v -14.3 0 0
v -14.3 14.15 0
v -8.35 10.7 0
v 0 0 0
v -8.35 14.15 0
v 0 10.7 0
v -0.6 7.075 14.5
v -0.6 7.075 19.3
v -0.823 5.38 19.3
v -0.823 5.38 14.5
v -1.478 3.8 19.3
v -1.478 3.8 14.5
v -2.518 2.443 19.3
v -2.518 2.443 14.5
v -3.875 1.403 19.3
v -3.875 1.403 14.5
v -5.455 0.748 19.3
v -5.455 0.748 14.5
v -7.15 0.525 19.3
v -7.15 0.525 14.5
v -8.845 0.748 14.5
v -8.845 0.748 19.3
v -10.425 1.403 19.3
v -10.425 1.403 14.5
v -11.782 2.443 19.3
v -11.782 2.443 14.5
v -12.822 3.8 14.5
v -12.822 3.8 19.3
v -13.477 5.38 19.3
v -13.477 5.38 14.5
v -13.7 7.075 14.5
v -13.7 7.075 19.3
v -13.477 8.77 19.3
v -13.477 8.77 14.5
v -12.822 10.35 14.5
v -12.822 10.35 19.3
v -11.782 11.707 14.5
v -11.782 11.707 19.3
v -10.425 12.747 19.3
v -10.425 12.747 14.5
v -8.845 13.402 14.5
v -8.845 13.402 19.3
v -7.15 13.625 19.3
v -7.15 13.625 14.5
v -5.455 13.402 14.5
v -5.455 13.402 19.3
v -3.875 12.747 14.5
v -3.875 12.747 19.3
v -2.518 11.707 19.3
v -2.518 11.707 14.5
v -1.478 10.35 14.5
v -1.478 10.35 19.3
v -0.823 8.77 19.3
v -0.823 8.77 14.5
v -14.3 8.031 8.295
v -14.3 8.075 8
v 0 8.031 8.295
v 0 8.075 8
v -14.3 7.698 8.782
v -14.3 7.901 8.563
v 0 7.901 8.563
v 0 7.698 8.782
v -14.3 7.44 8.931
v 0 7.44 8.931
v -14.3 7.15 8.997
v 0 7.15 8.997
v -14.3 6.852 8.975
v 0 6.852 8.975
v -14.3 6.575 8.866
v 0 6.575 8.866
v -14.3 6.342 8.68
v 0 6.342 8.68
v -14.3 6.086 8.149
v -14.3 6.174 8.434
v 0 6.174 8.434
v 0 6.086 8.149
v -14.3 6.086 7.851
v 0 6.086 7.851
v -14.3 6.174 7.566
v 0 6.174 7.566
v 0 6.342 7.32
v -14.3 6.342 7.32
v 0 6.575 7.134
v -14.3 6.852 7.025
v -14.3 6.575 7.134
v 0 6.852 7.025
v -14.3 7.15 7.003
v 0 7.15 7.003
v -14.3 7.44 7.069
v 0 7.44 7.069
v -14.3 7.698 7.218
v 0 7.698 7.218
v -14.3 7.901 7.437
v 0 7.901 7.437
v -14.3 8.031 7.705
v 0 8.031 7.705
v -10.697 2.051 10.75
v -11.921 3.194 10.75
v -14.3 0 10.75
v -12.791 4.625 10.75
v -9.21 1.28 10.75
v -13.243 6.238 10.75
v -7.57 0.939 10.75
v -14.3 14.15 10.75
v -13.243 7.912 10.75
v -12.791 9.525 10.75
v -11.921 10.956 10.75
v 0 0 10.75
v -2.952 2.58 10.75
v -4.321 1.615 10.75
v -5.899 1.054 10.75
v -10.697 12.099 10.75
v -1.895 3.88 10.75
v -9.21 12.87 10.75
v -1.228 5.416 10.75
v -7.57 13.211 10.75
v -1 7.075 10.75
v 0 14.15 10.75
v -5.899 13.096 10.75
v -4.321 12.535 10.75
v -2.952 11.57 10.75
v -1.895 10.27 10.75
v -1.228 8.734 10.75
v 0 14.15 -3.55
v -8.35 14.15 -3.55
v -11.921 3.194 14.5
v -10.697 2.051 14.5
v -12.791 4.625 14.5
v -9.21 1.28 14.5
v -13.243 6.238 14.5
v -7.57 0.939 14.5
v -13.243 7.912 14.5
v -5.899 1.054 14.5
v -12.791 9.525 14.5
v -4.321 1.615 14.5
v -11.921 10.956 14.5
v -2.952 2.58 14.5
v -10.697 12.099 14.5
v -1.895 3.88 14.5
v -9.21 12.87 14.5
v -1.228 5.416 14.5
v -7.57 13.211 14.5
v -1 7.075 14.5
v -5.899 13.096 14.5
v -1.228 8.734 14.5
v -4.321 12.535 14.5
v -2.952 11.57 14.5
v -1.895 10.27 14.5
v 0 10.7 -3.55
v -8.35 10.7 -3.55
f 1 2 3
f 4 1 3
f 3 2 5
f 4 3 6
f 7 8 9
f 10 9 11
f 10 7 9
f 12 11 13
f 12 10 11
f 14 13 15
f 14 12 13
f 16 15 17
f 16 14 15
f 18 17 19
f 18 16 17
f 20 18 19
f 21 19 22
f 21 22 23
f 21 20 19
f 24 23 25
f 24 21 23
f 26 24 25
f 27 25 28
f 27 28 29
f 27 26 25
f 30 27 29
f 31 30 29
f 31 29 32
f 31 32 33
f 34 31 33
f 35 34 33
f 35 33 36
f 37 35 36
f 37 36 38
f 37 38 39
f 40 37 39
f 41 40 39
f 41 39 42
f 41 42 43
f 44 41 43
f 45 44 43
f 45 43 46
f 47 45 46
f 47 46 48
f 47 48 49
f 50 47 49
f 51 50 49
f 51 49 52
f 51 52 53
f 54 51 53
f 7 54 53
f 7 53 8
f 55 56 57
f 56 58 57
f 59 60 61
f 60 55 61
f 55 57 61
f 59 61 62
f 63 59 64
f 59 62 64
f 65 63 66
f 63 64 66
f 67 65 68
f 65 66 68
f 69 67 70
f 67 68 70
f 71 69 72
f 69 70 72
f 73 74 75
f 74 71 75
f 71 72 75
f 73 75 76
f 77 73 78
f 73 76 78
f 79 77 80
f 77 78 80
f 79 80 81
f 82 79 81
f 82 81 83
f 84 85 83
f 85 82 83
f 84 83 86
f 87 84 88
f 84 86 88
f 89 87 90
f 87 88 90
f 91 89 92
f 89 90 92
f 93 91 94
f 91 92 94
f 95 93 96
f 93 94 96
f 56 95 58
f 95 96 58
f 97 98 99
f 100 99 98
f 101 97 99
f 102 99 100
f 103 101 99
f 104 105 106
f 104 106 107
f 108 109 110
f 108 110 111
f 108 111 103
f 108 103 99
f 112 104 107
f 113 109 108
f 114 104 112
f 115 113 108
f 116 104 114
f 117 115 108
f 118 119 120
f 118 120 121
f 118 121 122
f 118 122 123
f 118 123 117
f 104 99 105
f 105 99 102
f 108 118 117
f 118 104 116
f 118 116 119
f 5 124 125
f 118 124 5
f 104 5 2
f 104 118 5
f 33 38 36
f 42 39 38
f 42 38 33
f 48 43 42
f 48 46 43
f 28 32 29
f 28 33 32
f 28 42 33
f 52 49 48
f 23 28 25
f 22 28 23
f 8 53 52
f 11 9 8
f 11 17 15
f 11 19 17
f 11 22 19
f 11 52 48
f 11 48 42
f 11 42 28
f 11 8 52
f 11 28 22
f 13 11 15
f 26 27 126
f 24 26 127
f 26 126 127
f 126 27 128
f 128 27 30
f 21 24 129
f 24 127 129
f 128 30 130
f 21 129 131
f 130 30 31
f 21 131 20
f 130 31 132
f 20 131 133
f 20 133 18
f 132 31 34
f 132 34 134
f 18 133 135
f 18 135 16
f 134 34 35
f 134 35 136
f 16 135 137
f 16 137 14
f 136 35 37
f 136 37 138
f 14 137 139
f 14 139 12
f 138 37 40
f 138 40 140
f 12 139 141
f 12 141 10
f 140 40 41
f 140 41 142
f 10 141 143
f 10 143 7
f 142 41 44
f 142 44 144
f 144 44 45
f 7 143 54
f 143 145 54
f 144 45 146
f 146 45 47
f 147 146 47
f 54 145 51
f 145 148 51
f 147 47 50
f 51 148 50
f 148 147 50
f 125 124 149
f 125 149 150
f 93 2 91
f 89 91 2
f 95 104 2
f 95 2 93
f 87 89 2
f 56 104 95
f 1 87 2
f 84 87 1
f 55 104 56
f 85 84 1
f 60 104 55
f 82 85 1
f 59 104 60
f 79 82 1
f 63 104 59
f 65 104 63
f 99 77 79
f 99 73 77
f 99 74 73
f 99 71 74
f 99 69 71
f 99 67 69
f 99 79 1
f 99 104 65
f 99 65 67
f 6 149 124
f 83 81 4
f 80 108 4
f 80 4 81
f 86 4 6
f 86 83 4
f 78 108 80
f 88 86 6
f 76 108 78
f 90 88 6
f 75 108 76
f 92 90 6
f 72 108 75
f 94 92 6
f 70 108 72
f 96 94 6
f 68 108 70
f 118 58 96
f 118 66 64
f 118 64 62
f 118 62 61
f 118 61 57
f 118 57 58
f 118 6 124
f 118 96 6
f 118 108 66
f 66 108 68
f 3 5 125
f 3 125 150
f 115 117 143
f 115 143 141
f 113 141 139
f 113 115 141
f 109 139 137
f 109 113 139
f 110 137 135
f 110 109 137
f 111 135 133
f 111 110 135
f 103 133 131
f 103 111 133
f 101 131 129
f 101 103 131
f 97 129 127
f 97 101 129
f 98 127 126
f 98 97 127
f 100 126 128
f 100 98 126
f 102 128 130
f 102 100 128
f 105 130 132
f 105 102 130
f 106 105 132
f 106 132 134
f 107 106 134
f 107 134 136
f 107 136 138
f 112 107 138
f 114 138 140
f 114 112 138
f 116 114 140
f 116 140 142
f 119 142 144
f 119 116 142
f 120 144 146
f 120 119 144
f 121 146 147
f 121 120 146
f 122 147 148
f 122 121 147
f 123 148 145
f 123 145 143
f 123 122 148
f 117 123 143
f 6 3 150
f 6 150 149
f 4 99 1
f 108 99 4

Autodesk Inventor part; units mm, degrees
ref_plane "YZ Plane" through (0, 0, 0) normal (1, 0, 0) x (0, 1, 0)
ref_plane "XZ Plane" through (0, 0, 0) normal (0, 1, 0) x (-1, 0, 0)
sketch "Sketch1" plane through (0, 0, 0) normal (0, 0, 1) x (1, 0, 0)
  line L0 (0, 0) -> (-14.3, 0)
  line L1 (-14.3, 0) -> (-14.3, 14.15)
  line L2 (-14.3, 14.15) -> (0, 14.15)
  line L3 (0, 14.15) -> (0, 0)
  dimension "d0" = 14.15
  dimension "d1" = 14.3
extrude "Extrusion1" add sketch "Sketch1" along normal blind 8
sketch "Sketch2" plane through (0, 0, 0) normal (1, 0, 0) x (0, 0, -1)
  line L0 (0, 0) -> (0, 14.15) projected
  line L1 (0, 14.15) -> (-8, 14.15) projected
  line L2 (-8, 0) -> (-8, 14.15) projected
  line L3 (0, 0) -> (-8, 0) projected
  line L4 (0, 0) -> (0, 14.15) construction
  line L5 (0, 7.075) -> (-10.75, 7.075) construction
  line L6 (-8, 0) -> (-8, 14.15) projected
  circle A0 centre (-8, 7.075) radius 1
  circle A1 centre (-8, 7.075) radius 2.75
  point P0 (-8, 9.825)
  point P1 (-8, 4.325)
  point P2 (-8, 8.075)
  point P3 (-8, 6.075)
  dimension "d4" = 10.75
  dimension "d5" = 2
extrude "Extrusion2" add sketch "Sketch2" against normal up to surface (14.3 mm away) contours A1 L2 A0 | A0 L2 picked at (-9.5833, 8.5314) picked at (-8.3098, 7.4083)
extrude "Extrusion3" cut sketch "Sketch2" against normal up to surface (14.3 mm away) contours A0 L2 | L2 A0
ref_plane "Work Plane1" through (0, 7.075, 10.75) normal (0, 0, 1) x (1, 0, 0)
sketch "Sketch3" plane through (0, 7.075, 10.75) normal (0, 0, 1) x (1, 0, 0)
  line L0 (-14.3, 2.75) -> (0, 2.75) projected
  line L1 (0, 2.75) -> (0, 7.075) projected
  line L2 (0, 7.075) -> (-14.3, 7.075) projected
  line L3 (-14.3, 7.075) -> (-14.3, 2.75) projected
  line L4 (0, -2.75) -> (-14.3, -2.75) projected
  line L5 (-14.3, -2.75) -> (-14.3, -7.075) projected
  line L6 (-14.3, -7.075) -> (0, -7.075) projected
  line L7 (0, -7.075) -> (0, -2.75) projected
  line L8 (-14.3, 2.75) -> (-14.3, -2.75) projected
  line L9 (0, -2.75) -> (-14.3, -2.75) projected
  line L10 (0, 2.75) -> (0, -2.75) projected
  line L11 (-14.3, 2.75) -> (0, 2.75) projected
  line L12 (0, 7.075) -> (-14.3, 7.075) construction
  line L13 (-7.15, 7.075) -> (-7.15, -7.075) construction
  line L14 (-14.3, -7.075) -> (0, -7.075) construction
  circle A0 centre (-7.15, 0) radius 6.15
  dimension "d10" = 12.3
extrude "Extrusion4" add sketch "Sketch3" against normal up to surface (2.75 mm away) contours A0 L0 | L0 A0 L4 | L4 A0
extrude "Extrusion5" cut sketch "Sketch2" against normal up to surface (14.3 mm away) contours A0 L2 picked at (-8.3098, 7.4083)
extrude "Extrusion6" add sketch "Sketch3" along normal blind 8 contours A0 L0 | L0 A0 L4 | L4 A0
sketch "Sketch4" plane through (0, 0, 0) normal (1, 0, 0) x (0, 0, -1)
  line L0 (0, 0) -> (0, 14.15) construction
  line L1 (0, 7.075) -> (-14.5, 7.075) construction
  line L2 (-18.75, 0.925) -> (-8, 0.925) construction
  line L3 (-14.5, 0.925) -> (-23.2095, 0.925)
  line L4 (-23.2095, 0.925) -> (-23.2095, 17.6688)
  line L5 (-23.2095, 17.6688) -> (-14.5, 17.6688)
  line L6 (-14.5, 17.6688) -> (-14.5, 0.925)
  dimension "d17" = 14.5
extrude "Extrusion7" cut sketch "Sketch4" against normal through all
sketch "Sketch5" plane through (-7.15, 7.075, 14.5) normal (0, 0, 1) x (1, 0, 0)
  circle A0 centre (0, 0) radius 6.55
  point P0 (7.15, -7.075)
  dimension "d20" = 13.1
extrude "Extrusion8" add sketch "Sketch5" along normal blind 8
sketch "Sketch6" plane through (0, 0, 0) normal (1, 0, 0) x (0, 0, -1)
  circle A0 centre (-8, 7.075) radius 1 construction
  line L0 (0, 0) -> (0, 14.15) construction
  line L1 (0, 14.15) -> (-8, 14.15) construction
  line L2 (-8, 9.825) -> (-8, 14.15) construction
  arc A1 (-8, 9.825) -> (-8, 4.325) centre (-8, 7.075) ccw construction
  line L3 (-8, 0) -> (-8, 4.325) construction
  line L4 (0, 0) -> (-8, 0) construction
  line L5 (0, 14.15) -> (0, 0) construction
  line L6 (0, 7.075) -> (-19.3, 7.075) construction
  line L7 (-14.5, 0.525) -> (-22.5, 0.525) projected
  line L8 (-19.3, 0.525) -> (-27.8316, 0.525)
  line L9 (-27.8316, 0.525) -> (-27.8316, 15.7859)
  line L10 (-27.8316, 15.7859) -> (-19.3, 15.7859)
  line L11 (-19.3, 15.7859) -> (-19.3, 0.525)
  dimension "d23" = 19.3
extrude "Extrusion9" cut sketch "Sketch6" against normal through all
fillet "Fillet1" radius 5 4 edges at (-0.8245, 4.325, 8) (-0.8245, 9.825, 8) (-13.4755, 4.325, 8) (-13.4755, 9.825, 8)
sketch "Sketch7" plane through (0, 0, 0) normal (0, 0, -1) x (-1, 0, 0)
  line L0 (14.3, 0) -> (0, 0) projected
  line L1 (14.3, 14.15) -> (14.3, 0) projected
  line L2 (0, 14.15) -> (14.3, 14.15) projected
  line L3 (0, 0) -> (0, 14.15) projected
  line L4 (0, 14.15) -> (14.3, 14.15) projected
  line L5 (0, 14.15) -> (8.35, 14.15)
  line L6 (8.35, 14.15) -> (8.35, 10.7)
  line L7 (8.35, 10.7) -> (0, 10.7)
  line L8 (0, 10.7) -> (0, 14.15)
  dimension "d28" = 8.35
  dimension "d29" = 3.45
extrude "Extrusion10" add sketch "Sketch7" along normal blind 3.55 contours L3 L2 L6 L7
sketch "Sketch8" plane through (0, 7.075, 10.75) normal (0, 0, 1) x (1, 0, 0)
  line L0 (0, 7.075) -> (-14.3, 7.075) projected
  line L1 (-14.3, -7.075) -> (0, -7.075) projected
  line L2 (-14.3, 7.075) -> (-14.3, -7.075)
  line L3 (0, -7.075) -> (0, 7.075)
extrude "Extrusion11" add sketch "Sketch8" against normal up to surface (2.75 mm away)
extrude "Extrusion12" cut sketch "Sketch2" against normal up to surface (14.3 mm away) contours A0 L2 picked at (-8.3098, 7.4083)
sketch "Sketch9" plane through (0, 0, 0) normal (1, 0, 0) x (0, 0, -1)
  circle A0 centre (-8, 7.075) radius 1 projected
  line L0 (0, 0) -> (-10.75, 0) projected
  line L1 (0, 0) -> (0, 10.7) projected
  line L2 (0, 10.7) -> (3.55, 10.7) projected
  line L3 (3.55, 14.15) -> (3.55, 10.7) projected
  line L4 (3.55, 14.15) -> (-10.75, 14.15) projected
  line L5 (-10.75, 0) -> (-10.75, 14.15) projected
  line L6 (0, 7.075) -> (-142.5994, 7.075)
  line L7 (0, 7.075) -> (195.5312, 7.075)
properties part number "dummy camera"
